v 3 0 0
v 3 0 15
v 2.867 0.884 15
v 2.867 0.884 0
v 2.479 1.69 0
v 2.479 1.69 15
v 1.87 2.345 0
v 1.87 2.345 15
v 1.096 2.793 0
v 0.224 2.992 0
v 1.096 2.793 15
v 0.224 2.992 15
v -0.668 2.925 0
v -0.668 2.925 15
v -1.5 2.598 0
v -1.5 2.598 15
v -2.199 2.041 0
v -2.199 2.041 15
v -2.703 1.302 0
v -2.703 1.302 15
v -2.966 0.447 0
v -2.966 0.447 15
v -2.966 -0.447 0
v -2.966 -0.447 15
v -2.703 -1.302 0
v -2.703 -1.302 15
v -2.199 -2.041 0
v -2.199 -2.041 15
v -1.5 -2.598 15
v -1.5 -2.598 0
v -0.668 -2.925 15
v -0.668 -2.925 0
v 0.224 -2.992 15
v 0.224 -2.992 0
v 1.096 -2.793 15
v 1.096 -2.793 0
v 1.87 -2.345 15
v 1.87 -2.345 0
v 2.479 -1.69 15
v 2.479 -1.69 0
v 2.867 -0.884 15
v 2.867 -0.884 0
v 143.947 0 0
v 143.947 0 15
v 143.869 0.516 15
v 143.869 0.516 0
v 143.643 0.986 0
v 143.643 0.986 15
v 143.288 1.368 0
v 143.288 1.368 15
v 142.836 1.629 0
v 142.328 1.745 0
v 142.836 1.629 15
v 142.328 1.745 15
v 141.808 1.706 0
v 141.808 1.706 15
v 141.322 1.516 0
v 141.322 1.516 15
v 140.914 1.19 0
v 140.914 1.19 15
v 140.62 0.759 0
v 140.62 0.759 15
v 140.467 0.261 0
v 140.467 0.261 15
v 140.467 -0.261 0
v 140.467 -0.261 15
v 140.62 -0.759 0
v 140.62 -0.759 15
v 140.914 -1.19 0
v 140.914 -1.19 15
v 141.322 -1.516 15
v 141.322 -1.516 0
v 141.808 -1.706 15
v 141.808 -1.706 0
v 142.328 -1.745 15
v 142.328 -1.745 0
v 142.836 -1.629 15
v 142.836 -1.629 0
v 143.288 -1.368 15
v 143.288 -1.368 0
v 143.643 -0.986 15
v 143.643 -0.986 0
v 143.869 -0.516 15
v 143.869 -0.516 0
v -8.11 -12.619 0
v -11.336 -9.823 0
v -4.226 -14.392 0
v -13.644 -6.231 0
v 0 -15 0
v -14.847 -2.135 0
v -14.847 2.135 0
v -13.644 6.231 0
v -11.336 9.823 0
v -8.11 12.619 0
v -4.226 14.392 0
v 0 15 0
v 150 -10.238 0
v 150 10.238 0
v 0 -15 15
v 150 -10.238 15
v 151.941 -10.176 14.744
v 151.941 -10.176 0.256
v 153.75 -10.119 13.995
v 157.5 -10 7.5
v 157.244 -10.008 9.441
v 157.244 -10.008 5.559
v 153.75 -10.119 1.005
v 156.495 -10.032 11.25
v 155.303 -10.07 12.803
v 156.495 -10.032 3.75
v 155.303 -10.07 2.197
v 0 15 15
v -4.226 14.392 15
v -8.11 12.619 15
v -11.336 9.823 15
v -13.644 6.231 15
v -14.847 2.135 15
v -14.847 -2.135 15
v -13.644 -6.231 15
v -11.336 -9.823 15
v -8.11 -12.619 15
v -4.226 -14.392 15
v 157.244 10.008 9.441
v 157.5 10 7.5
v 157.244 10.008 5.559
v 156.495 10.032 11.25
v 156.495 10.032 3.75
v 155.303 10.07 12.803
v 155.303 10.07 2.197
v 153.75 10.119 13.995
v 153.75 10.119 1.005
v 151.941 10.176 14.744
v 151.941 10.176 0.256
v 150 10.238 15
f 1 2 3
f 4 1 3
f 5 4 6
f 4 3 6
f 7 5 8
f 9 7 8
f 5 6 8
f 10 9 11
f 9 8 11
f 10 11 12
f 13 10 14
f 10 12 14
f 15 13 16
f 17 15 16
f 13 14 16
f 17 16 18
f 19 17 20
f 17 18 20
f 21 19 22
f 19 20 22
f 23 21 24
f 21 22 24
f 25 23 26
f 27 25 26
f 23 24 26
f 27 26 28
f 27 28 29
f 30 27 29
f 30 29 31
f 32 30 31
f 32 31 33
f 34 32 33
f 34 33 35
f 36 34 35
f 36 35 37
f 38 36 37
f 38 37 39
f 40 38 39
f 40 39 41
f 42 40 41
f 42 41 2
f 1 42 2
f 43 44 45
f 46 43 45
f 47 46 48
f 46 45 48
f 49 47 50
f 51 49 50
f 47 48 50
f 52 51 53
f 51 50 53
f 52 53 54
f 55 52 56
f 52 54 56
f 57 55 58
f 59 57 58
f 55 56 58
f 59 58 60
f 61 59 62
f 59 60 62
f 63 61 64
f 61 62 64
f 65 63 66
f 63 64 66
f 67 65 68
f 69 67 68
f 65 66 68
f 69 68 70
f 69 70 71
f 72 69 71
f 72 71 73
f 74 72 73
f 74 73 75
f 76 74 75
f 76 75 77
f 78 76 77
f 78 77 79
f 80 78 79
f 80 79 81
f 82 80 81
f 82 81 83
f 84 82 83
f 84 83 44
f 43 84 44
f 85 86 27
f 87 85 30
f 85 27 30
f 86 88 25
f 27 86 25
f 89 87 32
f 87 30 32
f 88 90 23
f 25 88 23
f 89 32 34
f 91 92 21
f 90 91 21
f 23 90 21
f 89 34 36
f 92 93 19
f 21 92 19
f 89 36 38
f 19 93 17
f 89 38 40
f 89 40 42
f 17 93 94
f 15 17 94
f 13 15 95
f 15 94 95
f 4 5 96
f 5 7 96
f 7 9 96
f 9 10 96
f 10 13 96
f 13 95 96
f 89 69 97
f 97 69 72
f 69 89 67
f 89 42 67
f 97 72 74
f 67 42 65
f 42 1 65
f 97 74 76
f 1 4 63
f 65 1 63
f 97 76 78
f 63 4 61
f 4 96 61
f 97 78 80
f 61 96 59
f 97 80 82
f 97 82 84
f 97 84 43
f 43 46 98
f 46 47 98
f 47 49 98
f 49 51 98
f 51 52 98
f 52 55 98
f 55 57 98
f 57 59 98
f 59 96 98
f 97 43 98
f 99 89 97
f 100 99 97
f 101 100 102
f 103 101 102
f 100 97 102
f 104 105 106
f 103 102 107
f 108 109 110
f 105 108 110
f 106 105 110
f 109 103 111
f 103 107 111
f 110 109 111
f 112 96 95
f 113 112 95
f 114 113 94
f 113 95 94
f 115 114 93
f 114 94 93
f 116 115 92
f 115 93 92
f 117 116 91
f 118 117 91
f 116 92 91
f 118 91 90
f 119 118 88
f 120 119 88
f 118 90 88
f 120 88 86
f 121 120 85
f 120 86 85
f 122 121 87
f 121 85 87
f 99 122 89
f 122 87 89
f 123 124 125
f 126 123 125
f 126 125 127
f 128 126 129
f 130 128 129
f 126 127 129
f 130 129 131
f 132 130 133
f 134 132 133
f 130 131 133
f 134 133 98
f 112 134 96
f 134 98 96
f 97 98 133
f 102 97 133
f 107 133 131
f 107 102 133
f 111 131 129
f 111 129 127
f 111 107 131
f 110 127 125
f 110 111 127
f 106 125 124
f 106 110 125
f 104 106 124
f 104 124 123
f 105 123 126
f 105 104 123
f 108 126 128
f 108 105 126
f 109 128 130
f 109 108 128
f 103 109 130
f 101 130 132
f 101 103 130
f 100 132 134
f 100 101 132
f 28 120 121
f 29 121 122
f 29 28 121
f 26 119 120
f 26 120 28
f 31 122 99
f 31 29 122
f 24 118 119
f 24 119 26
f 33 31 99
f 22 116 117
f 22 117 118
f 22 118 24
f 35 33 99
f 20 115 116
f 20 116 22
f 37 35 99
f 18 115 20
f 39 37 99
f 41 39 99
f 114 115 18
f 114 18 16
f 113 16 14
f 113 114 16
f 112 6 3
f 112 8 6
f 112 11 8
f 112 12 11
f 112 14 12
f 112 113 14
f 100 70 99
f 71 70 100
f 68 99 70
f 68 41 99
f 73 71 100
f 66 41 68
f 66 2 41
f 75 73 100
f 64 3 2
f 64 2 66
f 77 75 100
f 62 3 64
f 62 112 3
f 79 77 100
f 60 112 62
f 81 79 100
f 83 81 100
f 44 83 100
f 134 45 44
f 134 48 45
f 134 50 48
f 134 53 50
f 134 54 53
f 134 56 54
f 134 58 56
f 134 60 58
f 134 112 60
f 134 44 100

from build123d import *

# Parameters (mm, degrees)
BOSS_EXTRUDE2_DEPTH = 15
FILLET4_START       = -11
FILLET4_DEPTH       = 22
SKETCH2_R           = 1.75
CUT_EXTRUDE1_DEPTH  = 32
SKETCH3_R           = 3
CUT_EXTRUDE2_DEPTH  = 47


with BuildPart() as part:
    # Sketch1 → Boss-Extrude2 (new body)
    with BuildSketch(Plane.XY):
        with BuildLine():
            Line((157.5, -10), (157.5, 10))
            Line((157.5, 10), (0, 15))
            ThreePointArc((0, 15), (-15, 0), (0, -15))
            Line((0, -15), (157.5, -10))
        make_face()
    extrude(amount=BOSS_EXTRUDE2_DEPTH)

    # Fillet4: read off the stored shape, not the designer's step
    # Fillet4 outline → Fillet4 (cut)
    with BuildSketch(Plane(origin=(0, 0, 0), x_dir=(1, 0, 0), z_dir=(0, 1, 0)).offset(FILLET4_START)):
        with BuildLine():
            ThreePointArc((150, 0), (155.303300859, -2.196699141), (157.5, -7.5))
            Line((157.5, -7.5), (157.5, 0))
            Line((157.5, 0), (150, 0))
        make_face()
        with BuildLine():
            ThreePointArc((157.5, -7.5), (155.303300859, -12.803300859), (150, -15))
            Line((150, -15), (157.5, -15))
            Line((157.5, -15), (157.5, -7.5))
        make_face()
    extrude(amount=FILLET4_DEPTH, mode=Mode.SUBTRACT)

    # Sketch2 → Cut-Extrude1 (cut)
    with BuildSketch(Plane.XY.offset(15)):
        with Locations((142.197100849, 0)):
            Circle(SKETCH2_R)
    extrude(amount=-CUT_EXTRUDE1_DEPTH, mode=Mode.SUBTRACT)

    # Sketch3 → Cut-Extrude2 (cut)
    with BuildSketch(Plane.XY.offset(15)):
        Circle(SKETCH3_R)
    extrude(amount=-CUT_EXTRUDE2_DEPTH, mode=Mode.SUBTRACT)


solid = part.part
